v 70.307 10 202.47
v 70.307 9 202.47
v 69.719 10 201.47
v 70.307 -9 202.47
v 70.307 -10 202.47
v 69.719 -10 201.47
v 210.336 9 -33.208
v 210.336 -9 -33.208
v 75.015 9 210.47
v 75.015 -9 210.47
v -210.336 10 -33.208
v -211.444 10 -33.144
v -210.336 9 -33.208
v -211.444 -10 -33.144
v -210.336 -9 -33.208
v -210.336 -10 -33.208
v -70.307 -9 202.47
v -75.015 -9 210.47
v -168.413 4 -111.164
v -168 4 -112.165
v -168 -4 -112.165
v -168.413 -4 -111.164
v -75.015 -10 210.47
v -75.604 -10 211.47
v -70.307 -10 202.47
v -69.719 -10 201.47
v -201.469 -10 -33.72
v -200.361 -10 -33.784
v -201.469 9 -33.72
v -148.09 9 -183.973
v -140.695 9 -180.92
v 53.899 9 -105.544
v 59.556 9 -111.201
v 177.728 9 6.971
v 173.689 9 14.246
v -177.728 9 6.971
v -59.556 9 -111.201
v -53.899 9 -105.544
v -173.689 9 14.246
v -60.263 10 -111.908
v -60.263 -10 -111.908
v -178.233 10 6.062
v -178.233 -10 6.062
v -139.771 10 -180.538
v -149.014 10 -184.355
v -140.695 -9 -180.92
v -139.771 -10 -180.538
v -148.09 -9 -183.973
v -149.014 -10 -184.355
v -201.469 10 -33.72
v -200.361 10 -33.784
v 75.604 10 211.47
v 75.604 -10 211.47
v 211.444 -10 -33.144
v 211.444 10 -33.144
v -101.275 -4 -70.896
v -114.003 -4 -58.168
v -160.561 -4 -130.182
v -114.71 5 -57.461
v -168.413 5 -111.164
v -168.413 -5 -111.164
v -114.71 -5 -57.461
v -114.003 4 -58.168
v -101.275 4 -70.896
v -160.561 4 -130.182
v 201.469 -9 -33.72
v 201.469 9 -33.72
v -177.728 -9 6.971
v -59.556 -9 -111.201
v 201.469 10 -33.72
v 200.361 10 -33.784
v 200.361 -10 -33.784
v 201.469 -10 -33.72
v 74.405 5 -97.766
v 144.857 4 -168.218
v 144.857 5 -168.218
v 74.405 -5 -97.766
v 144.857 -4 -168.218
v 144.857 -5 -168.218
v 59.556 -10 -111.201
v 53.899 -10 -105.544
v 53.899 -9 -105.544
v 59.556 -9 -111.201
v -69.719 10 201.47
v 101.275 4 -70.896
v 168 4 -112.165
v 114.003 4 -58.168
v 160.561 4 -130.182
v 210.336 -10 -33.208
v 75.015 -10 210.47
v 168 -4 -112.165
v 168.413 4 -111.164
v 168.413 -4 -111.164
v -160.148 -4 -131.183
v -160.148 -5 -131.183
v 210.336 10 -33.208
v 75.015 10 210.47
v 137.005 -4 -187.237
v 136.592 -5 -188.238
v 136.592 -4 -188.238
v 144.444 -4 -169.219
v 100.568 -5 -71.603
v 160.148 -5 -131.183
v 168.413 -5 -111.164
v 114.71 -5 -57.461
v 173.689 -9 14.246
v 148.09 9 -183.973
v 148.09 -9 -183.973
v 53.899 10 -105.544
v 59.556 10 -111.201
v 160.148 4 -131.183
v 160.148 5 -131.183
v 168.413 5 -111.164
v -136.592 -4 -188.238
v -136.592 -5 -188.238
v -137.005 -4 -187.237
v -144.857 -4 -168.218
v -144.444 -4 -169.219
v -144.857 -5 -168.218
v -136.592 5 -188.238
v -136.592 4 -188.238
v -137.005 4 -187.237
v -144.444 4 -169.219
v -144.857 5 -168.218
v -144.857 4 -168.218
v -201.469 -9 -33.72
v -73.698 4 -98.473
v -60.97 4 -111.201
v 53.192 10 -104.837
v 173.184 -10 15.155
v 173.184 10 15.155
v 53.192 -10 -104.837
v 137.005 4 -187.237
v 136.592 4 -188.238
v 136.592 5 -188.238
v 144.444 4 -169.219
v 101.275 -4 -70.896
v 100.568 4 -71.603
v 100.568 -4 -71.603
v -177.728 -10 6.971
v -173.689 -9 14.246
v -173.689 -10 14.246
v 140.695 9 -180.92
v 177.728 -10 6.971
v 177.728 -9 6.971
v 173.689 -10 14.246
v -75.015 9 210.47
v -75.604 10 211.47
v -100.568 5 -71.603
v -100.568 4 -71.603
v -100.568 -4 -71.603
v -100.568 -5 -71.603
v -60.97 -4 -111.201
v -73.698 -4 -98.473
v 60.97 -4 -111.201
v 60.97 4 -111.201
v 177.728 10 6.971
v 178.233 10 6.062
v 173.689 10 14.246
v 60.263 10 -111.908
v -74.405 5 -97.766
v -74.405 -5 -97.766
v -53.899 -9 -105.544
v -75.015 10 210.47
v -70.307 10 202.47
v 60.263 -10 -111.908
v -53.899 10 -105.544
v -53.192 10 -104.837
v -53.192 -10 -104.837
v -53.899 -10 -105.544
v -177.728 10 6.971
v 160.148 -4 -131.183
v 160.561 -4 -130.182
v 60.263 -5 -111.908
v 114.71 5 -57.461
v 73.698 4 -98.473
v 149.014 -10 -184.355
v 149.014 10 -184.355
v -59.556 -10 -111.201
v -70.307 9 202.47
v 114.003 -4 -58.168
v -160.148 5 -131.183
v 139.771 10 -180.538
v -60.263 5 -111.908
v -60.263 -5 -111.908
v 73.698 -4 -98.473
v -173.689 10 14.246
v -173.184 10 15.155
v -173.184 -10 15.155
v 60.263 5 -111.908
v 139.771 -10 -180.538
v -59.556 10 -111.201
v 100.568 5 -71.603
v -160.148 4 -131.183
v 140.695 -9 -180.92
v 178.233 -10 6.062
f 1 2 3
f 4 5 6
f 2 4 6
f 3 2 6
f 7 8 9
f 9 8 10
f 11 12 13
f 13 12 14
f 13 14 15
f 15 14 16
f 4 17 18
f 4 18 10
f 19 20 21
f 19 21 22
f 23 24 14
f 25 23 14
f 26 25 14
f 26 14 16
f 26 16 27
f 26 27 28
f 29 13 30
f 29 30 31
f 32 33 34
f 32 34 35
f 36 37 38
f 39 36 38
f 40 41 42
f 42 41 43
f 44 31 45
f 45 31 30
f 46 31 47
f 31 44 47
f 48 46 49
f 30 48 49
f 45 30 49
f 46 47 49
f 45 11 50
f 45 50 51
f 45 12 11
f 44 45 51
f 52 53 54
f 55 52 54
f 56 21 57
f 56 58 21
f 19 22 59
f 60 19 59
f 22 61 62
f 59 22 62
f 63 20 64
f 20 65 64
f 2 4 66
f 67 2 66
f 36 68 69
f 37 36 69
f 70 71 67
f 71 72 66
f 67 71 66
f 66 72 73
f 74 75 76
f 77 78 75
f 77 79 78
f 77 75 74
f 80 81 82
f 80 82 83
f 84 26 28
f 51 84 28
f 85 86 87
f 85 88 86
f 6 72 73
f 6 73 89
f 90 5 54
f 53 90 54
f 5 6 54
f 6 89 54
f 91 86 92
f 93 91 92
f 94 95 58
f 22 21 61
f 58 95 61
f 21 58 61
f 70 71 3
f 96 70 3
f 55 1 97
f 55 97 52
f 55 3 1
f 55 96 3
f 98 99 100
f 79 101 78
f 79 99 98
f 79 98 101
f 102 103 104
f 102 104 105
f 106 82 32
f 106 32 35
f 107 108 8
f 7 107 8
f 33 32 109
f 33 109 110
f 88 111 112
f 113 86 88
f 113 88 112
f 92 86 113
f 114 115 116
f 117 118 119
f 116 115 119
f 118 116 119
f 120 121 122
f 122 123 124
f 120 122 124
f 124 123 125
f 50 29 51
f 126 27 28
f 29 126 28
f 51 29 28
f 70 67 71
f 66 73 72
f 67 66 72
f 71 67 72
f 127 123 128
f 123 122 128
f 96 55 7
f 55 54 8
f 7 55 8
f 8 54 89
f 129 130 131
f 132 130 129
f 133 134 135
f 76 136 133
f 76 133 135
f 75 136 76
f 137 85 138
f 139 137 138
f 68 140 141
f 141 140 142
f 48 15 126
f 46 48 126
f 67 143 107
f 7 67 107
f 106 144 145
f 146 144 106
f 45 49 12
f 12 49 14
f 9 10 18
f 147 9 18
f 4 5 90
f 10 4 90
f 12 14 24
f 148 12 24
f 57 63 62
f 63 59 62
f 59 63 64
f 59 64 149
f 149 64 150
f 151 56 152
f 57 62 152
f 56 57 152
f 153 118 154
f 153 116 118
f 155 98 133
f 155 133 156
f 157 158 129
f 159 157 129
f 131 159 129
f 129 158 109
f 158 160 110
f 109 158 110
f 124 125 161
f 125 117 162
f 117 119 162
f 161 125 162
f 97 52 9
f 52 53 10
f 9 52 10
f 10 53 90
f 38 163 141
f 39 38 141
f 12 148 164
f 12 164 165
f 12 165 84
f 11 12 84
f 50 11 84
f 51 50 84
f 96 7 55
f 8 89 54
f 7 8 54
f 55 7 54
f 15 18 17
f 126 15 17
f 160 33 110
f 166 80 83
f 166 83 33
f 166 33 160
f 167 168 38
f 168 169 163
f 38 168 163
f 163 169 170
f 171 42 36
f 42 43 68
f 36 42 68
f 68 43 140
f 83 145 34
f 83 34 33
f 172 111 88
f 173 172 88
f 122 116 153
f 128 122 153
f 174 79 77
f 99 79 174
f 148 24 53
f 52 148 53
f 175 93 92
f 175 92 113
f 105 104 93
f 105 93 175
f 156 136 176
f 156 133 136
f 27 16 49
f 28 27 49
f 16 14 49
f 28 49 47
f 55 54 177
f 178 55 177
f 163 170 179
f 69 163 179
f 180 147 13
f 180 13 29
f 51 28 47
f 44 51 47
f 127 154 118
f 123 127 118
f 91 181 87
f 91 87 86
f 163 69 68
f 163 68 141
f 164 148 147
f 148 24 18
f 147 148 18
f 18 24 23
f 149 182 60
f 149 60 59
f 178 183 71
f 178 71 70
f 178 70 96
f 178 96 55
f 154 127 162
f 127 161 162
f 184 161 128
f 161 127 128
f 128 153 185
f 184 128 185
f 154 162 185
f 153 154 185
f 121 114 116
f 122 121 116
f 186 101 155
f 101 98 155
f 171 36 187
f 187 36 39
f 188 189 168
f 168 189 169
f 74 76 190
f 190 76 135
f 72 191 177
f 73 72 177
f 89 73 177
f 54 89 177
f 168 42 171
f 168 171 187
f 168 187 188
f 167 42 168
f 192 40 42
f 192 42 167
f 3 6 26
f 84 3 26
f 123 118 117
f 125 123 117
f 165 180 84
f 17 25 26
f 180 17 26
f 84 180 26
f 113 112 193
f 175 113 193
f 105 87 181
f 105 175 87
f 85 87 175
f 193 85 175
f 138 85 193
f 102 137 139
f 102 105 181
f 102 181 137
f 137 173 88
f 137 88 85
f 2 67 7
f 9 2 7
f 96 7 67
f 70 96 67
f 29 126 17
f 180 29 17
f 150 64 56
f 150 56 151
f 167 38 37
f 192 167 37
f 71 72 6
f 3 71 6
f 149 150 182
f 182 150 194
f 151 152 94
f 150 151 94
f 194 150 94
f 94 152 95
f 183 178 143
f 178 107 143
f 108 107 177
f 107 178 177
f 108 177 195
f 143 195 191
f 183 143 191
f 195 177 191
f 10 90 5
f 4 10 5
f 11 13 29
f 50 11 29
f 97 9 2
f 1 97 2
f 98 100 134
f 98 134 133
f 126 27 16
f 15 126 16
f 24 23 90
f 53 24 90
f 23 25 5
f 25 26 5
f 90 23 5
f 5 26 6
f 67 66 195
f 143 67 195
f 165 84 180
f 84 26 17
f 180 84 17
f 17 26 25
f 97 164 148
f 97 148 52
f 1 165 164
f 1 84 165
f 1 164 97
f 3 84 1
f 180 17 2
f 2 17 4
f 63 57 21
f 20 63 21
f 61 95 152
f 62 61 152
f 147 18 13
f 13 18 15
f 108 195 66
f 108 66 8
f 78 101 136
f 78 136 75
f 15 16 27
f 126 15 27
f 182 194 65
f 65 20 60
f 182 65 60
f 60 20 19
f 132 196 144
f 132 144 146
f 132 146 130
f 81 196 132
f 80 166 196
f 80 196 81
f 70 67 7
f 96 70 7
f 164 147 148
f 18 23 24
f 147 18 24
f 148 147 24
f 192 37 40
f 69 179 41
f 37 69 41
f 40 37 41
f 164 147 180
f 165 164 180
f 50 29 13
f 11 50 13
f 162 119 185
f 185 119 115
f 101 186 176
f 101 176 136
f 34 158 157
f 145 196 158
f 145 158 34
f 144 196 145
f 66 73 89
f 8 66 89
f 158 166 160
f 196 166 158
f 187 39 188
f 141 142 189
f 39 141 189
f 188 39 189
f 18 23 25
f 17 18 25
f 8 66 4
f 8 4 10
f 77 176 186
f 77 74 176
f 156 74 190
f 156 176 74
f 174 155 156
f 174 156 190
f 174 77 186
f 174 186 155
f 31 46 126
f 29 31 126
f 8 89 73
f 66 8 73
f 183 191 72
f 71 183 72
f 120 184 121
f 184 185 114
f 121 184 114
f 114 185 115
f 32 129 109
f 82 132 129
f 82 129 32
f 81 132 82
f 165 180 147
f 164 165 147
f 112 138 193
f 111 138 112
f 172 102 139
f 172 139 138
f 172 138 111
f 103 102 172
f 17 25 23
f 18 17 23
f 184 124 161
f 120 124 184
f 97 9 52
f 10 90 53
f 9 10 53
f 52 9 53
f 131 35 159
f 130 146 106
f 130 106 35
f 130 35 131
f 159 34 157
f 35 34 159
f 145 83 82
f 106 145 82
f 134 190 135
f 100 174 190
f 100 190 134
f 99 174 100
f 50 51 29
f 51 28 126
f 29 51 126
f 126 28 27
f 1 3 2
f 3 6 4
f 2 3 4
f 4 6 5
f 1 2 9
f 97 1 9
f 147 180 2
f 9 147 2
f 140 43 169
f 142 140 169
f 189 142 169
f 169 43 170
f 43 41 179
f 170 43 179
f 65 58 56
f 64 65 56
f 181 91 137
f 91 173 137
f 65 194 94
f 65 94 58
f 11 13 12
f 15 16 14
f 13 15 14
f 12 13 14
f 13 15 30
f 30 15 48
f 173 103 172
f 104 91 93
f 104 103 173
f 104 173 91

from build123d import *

# Parameters (mm, degrees)
MEMBER_START      = -10
MEMBER_1_DEPTH    = 20
MEMBER_1_2_DEPTH  = 1
MEMBER_START_2    = 9
MEMBER_1_3_DEPTH  = 1
MEMBER_1_4_DEPTH  = 20
MEMBER_1_5_DEPTH  = 1
MEMBER_1_6_DEPTH  = 1
MEMBER_1_7_DEPTH  = 20
MEMBER_1_8_DEPTH  = 1
MEMBER_1_9_DEPTH  = 1
MEMBER_1_10_DEPTH = 20
MEMBER_1_11_DEPTH = 1
MEMBER_1_12_DEPTH = 1
MEMBER_1_13_DEPTH = 20
MEMBER_1_14_DEPTH = 1
MEMBER_1_15_DEPTH = 1
MEMBER_1_16_DEPTH = 20
MEMBER_1_17_DEPTH = 1
MEMBER_1_18_DEPTH = 1
MEMBER_START_3    = -5
MEMBER_1_19_DEPTH = 1
MEMBER_START_4    = 4
MEMBER_1_20_DEPTH = 1
MEMBER_START_5    = -4
MEMBER_1_21_DEPTH = 8
MEMBER_1_22_DEPTH = 1
MEMBER_1_23_DEPTH = 1
MEMBER_1_24_DEPTH = 8


# Read off the part's stored shape, not the designer's step: 结构构件1
with BuildPart() as part:
    # Member 1 outline → Member 1 (new body)
    with BuildSketch(Plane(origin=(0, 0, 0), x_dir=(1, 0, 0), z_dir=(0, 1, 0)).offset(MEMBER_START)):
        Polygon((211.444133454, 33.144126958), (149.013966185, 184.354692044), (148.089647891, 183.973069598), (210.3358297, 33.208131146), align=None)
        Polygon((201.469399669, 33.720164656), (140.695101539, 180.92009003), (139.770783245, 180.538467584), (200.361095915, 33.784168845), align=None)
    extrude(amount=MEMBER_1_DEPTH)

    # Member 1 2 outline → Member 1 2 (add)
    with BuildSketch(Plane(origin=(0, 0, 0), x_dir=(1, 0, 0), z_dir=(0, 1, 0)).offset(MEMBER_START)):
        Polygon((210.3358297, 33.208131146), (148.089647891, 183.973069598), (140.695101539, 180.92009003), (201.469399669, 33.720164656), align=None)
    extrude(amount=MEMBER_1_2_DEPTH)

    # Member 1 3 outline → Member 1 3 (add)
    with BuildSketch(Plane(origin=(0, 0, 0), x_dir=(1, 0, 0), z_dir=(0, 1, 0)).offset(MEMBER_START_2)):
        Polygon((210.3358297, 33.208131146), (148.089647891, 183.973069598), (140.695101539, 180.92009003), (201.469399669, 33.720164656), align=None)
    extrude(amount=MEMBER_1_3_DEPTH)


with BuildPart() as body_2:
    # Member 1 4 outline → Member 1 4 (new body)
    with BuildSketch(Plane(origin=(0, 0, 0), x_dir=(1, 0, 0), z_dir=(0, 1, 0)).offset(MEMBER_START)):
        Polygon((200.361095915, 33.784168845), (69.718713444, -201.469825071), (70.30723549, -202.469825071), (201.469399669, 33.720164656), align=None)
        Polygon((210.3358297, 33.208131146), (75.015411857, -210.469825071), (75.603933902, -211.469825071), (211.444133454, 33.144126958), align=None)
    extrude(amount=MEMBER_1_4_DEPTH)

    # Member 1 5 outline → Member 1 5 (add)
    with BuildSketch(Plane(origin=(0, 0, 0), x_dir=(1, 0, 0), z_dir=(0, 1, 0)).offset(MEMBER_START)):
        Polygon((201.469399669, 33.720164656), (70.30723549, -202.469825071), (75.015411856, -210.469825071), (210.3358297, 33.208131146), align=None)
    extrude(amount=MEMBER_1_5_DEPTH)

    # Member 1 6 outline → Member 1 6 (add)
    with BuildSketch(Plane(origin=(0, 0, 0), x_dir=(1, 0, 0), z_dir=(0, 1, 0)).offset(MEMBER_START_2)):
        Polygon((201.469399669, 33.720164656), (70.30723549, -202.469825071), (75.015411856, -210.469825071), (210.3358297, 33.208131146), align=None)
    extrude(amount=MEMBER_1_6_DEPTH)


with BuildPart() as body_3:
    # Member 1 7 outline → Member 1 7 (new body)
    with BuildSketch(Plane(origin=(0, 0, 0), x_dir=(1, 0, 0), z_dir=(0, 1, 0)).offset(MEMBER_START)):
        Polygon((69.718713444, -201.469825071), (-69.718713444, -201.469825071), (-70.30723549, -202.469825071), (70.30723549, -202.469825071), align=None)
        Polygon((75.015411857, -210.469825071), (-75.015411857, -210.469825071), (-75.603933902, -211.469825071), (75.603933902, -211.469825071), align=None)
    extrude(amount=MEMBER_1_7_DEPTH)

    # Member 1 8 outline → Member 1 8 (add)
    with BuildSketch(Plane(origin=(0, 0, 0), x_dir=(1, 0, 0), z_dir=(0, 1, 0)).offset(MEMBER_START)):
        Polygon((70.30723549, -202.469825071), (-70.30723549, -202.469825071), (-75.015411856, -210.469825071), (75.015411857, -210.469825071), align=None)
    extrude(amount=MEMBER_1_8_DEPTH)

    # Member 1 9 outline → Member 1 9 (add)
    with BuildSketch(Plane(origin=(0, 0, 0), x_dir=(1, 0, 0), z_dir=(0, 1, 0)).offset(MEMBER_START_2)):
        Polygon((70.30723549, -202.469825071), (-70.30723549, -202.469825071), (-75.015411856, -210.469825071), (75.015411857, -210.469825071), align=None)
    extrude(amount=MEMBER_1_9_DEPTH)


with BuildPart() as body_4:
    # Member 1 10 outline → Member 1 10 (new body)
    with BuildSketch(Plane(origin=(0, 0, 0), x_dir=(1, 0, 0), z_dir=(0, 1, 0)).offset(MEMBER_START)):
        Polygon((-69.718713444, -201.469825071), (-200.361095915, 33.784168845), (-201.469399669, 33.720164656), (-70.30723549, -202.469825071), align=None)
        Polygon((-75.015411857, -210.469825071), (-210.3358297, 33.208131146), (-211.444133454, 33.144126958), (-75.603933902, -211.469825071), align=None)
    extrude(amount=MEMBER_1_10_DEPTH)

    # Member 1 11 outline → Member 1 11 (add)
    with BuildSketch(Plane(origin=(0, 0, 0), x_dir=(1, 0, 0), z_dir=(0, 1, 0)).offset(MEMBER_START)):
        Polygon((-70.30723549, -202.469825071), (-201.469399669, 33.720164656), (-210.3358297, 33.208131147), (-75.015411857, -210.469825071), align=None)
    extrude(amount=MEMBER_1_11_DEPTH)

    # Member 1 12 outline → Member 1 12 (add)
    with BuildSketch(Plane(origin=(0, 0, 0), x_dir=(1, 0, 0), z_dir=(0, 1, 0)).offset(MEMBER_START_2)):
        Polygon((-70.30723549, -202.469825071), (-201.469399669, 33.720164656), (-210.3358297, 33.208131147), (-75.015411857, -210.469825071), align=None)
    extrude(amount=MEMBER_1_12_DEPTH)


with BuildPart() as body_5:
    # Member 1 13 outline → Member 1 13 (new body)
    with BuildSketch(Plane(origin=(0, 0, 0), x_dir=(1, 0, 0), z_dir=(0, 1, 0)).offset(MEMBER_START)):
        Polygon((-149.013966185, 184.354692044), (-211.444133454, 33.144126958), (-210.3358297, 33.208131147), (-148.089647891, 183.973069598), align=None)
        Polygon((-140.695101539, 180.92009003), (-201.469399669, 33.720164656), (-200.361095915, 33.784168845), (-139.770783245, 180.538467584), align=None)
    extrude(amount=MEMBER_1_13_DEPTH)

    # Member 1 14 outline → Member 1 14 (add)
    with BuildSketch(Plane(origin=(0, 0, 0), x_dir=(1, 0, 0), z_dir=(0, 1, 0)).offset(MEMBER_START)):
        Polygon((-148.089647891, 183.973069598), (-210.3358297, 33.208131146), (-201.469399669, 33.720164656), (-140.695101539, 180.92009003), align=None)
    extrude(amount=MEMBER_1_14_DEPTH)

    # Member 1 15 outline → Member 1 15 (add)
    with BuildSketch(Plane(origin=(0, 0, 0), x_dir=(1, 0, 0), z_dir=(0, 1, 0)).offset(MEMBER_START_2)):
        Polygon((-148.089647891, 183.973069598), (-210.3358297, 33.208131146), (-201.469399669, 33.720164656), (-140.695101539, 180.92009003), align=None)
    extrude(amount=MEMBER_1_15_DEPTH)


with BuildPart() as body_6:
    # Member 1 16 outline → Member 1 16 (new body)
    with BuildSketch(Plane(origin=(0, 0, 0), x_dir=(1, 0, 0), z_dir=(0, 1, 0)).offset(MEMBER_START)):
        Polygon((-173.184026314, -15.154881759), (-53.191859315, 104.83728524), (-53.898966096, 105.544392022), (-173.688967715, -14.245609598), align=None)
        Polygon((-177.728498928, -6.971432311), (-59.555820345, 111.201246271), (-60.262927127, 111.908353052), (-178.233440329, -6.06216015), align=None)
    extrude(amount=MEMBER_1_16_DEPTH)

    # Member 1 17 outline → Member 1 17 (add)
    with BuildSketch(Plane(origin=(0, 0, 0), x_dir=(1, 0, 0), z_dir=(0, 1, 0)).offset(MEMBER_START)):
        Polygon((-173.688967715, -14.245609598), (-53.898966096, 105.544392022), (-59.555820346, 111.20124627), (-177.728498928, -6.971432311), align=None)
    extrude(amount=MEMBER_1_17_DEPTH)

    # Member 1 18 outline → Member 1 18 (add)
    with BuildSketch(Plane(origin=(0, 0, 0), x_dir=(1, 0, 0), z_dir=(0, 1, 0)).offset(MEMBER_START_2)):
        Polygon((-173.688967715, -14.245609598), (-53.898966096, 105.544392022), (-59.555820346, 111.20124627), (-177.728498928, -6.971432311), align=None)
    extrude(amount=MEMBER_1_18_DEPTH)


with BuildPart() as body_7:
    # Member 1 19 outline → Member 1 19 (new body)
    with BuildSketch(Plane(origin=(0, 0, 0), x_dir=(1, 0, 0), z_dir=(0, 1, 0)).offset(MEMBER_START_3)):
        Polygon((-74.40506275, 97.766217429), (-60.262927127, 111.908353052), (-136.592085909, 188.237511835), (-144.857325246, 168.218479924), align=None)
    extrude(amount=MEMBER_1_19_DEPTH)

    # Member 1 20 outline → Member 1 20 (add)
    with BuildSketch(Plane(origin=(0, 0, 0), x_dir=(1, 0, 0), z_dir=(0, 1, 0)).offset(MEMBER_START_4)):
        Polygon((-74.40506275, 97.766217429), (-60.262927127, 111.908353052), (-136.592085909, 188.237511835), (-144.857325246, 168.218479924), align=None)
    extrude(amount=MEMBER_1_20_DEPTH)

    # Member 1 21 outline → Member 1 21 (add)
    with BuildSketch(Plane(origin=(0, 0, 0), x_dir=(1, 0, 0), z_dir=(0, 1, 0)).offset(MEMBER_START_5)):
        Polygon((-74.40506275, 97.766217429), (-73.697955969, 98.47332421), (-144.444063279, 169.21943152), (-144.857325246, 168.218479924), align=None)
        Polygon((-137.005347876, 187.236560239), (-60.970033908, 111.201246271), (-60.262927127, 111.908353052), (-136.592085909, 188.237511835), align=None)
    extrude(amount=MEMBER_1_21_DEPTH)


with BuildPart() as body_8:
    # Member 1 22 outline → Member 1 22 (new body)
    with BuildSketch(Plane(origin=(0, 0, 0), x_dir=(1, 0, 0), z_dir=(0, 1, 0)).offset(MEMBER_START_3)):
        Polygon((-114.710149278, 57.461130901), (-100.568013654, 71.603266525), (-160.148018019, 131.18327089), (-168.413257356, 111.164238979), align=None)
    extrude(amount=MEMBER_1_22_DEPTH)

    # Member 1 23 outline → Member 1 23 (add)
    with BuildSketch(Plane(origin=(0, 0, 0), x_dir=(1, 0, 0), z_dir=(0, 1, 0)).offset(MEMBER_START_4)):
        Polygon((-114.710149278, 57.461130901), (-100.568013654, 71.603266525), (-160.148018019, 131.18327089), (-168.413257356, 111.164238979), align=None)
    extrude(amount=MEMBER_1_23_DEPTH)

    # Member 1 24 outline → Member 1 24 (add)
    with BuildSketch(Plane(origin=(0, 0, 0), x_dir=(1, 0, 0), z_dir=(0, 1, 0)).offset(MEMBER_START_5)):
        Polygon((-114.710149278, 57.461130901), (-114.003042497, 58.168237682), (-167.99999539, 112.165190575), (-168.413257356, 111.164238979), align=None)
        Polygon((-160.561279986, 130.182319294), (-101.275120435, 70.896159743), (-100.568013654, 71.603266525), (-160.148018019, 131.18327089), align=None)
    extrude(amount=MEMBER_1_24_DEPTH)


with BuildPart() as body_9:
    # 镜向1: mirrored copy
    add(body_7.part.mirror(Plane(origin=(0, 0, 0), x_dir=(0, 0, 1), z_dir=(1, 0, 0))))


with BuildPart() as body_10:
    # Mirror 1 2: mirrored copy
    add(body_8.part.mirror(Plane(origin=(0, 0, 0), x_dir=(0, 0, 1), z_dir=(1, 0, 0))))


with BuildPart() as body_11:
    # Mirror 1 3: mirrored copy
    add(body_6.part.mirror(Plane(origin=(0, 0, 0), x_dir=(0, 0, 1), z_dir=(1, 0, 0))))


solid = Compound([part.part, body_2.part, body_3.part, body_4.part, body_5.part, body_6.part, body_7.part, body_8.part, body_9.part, body_10.part, body_11.part])
